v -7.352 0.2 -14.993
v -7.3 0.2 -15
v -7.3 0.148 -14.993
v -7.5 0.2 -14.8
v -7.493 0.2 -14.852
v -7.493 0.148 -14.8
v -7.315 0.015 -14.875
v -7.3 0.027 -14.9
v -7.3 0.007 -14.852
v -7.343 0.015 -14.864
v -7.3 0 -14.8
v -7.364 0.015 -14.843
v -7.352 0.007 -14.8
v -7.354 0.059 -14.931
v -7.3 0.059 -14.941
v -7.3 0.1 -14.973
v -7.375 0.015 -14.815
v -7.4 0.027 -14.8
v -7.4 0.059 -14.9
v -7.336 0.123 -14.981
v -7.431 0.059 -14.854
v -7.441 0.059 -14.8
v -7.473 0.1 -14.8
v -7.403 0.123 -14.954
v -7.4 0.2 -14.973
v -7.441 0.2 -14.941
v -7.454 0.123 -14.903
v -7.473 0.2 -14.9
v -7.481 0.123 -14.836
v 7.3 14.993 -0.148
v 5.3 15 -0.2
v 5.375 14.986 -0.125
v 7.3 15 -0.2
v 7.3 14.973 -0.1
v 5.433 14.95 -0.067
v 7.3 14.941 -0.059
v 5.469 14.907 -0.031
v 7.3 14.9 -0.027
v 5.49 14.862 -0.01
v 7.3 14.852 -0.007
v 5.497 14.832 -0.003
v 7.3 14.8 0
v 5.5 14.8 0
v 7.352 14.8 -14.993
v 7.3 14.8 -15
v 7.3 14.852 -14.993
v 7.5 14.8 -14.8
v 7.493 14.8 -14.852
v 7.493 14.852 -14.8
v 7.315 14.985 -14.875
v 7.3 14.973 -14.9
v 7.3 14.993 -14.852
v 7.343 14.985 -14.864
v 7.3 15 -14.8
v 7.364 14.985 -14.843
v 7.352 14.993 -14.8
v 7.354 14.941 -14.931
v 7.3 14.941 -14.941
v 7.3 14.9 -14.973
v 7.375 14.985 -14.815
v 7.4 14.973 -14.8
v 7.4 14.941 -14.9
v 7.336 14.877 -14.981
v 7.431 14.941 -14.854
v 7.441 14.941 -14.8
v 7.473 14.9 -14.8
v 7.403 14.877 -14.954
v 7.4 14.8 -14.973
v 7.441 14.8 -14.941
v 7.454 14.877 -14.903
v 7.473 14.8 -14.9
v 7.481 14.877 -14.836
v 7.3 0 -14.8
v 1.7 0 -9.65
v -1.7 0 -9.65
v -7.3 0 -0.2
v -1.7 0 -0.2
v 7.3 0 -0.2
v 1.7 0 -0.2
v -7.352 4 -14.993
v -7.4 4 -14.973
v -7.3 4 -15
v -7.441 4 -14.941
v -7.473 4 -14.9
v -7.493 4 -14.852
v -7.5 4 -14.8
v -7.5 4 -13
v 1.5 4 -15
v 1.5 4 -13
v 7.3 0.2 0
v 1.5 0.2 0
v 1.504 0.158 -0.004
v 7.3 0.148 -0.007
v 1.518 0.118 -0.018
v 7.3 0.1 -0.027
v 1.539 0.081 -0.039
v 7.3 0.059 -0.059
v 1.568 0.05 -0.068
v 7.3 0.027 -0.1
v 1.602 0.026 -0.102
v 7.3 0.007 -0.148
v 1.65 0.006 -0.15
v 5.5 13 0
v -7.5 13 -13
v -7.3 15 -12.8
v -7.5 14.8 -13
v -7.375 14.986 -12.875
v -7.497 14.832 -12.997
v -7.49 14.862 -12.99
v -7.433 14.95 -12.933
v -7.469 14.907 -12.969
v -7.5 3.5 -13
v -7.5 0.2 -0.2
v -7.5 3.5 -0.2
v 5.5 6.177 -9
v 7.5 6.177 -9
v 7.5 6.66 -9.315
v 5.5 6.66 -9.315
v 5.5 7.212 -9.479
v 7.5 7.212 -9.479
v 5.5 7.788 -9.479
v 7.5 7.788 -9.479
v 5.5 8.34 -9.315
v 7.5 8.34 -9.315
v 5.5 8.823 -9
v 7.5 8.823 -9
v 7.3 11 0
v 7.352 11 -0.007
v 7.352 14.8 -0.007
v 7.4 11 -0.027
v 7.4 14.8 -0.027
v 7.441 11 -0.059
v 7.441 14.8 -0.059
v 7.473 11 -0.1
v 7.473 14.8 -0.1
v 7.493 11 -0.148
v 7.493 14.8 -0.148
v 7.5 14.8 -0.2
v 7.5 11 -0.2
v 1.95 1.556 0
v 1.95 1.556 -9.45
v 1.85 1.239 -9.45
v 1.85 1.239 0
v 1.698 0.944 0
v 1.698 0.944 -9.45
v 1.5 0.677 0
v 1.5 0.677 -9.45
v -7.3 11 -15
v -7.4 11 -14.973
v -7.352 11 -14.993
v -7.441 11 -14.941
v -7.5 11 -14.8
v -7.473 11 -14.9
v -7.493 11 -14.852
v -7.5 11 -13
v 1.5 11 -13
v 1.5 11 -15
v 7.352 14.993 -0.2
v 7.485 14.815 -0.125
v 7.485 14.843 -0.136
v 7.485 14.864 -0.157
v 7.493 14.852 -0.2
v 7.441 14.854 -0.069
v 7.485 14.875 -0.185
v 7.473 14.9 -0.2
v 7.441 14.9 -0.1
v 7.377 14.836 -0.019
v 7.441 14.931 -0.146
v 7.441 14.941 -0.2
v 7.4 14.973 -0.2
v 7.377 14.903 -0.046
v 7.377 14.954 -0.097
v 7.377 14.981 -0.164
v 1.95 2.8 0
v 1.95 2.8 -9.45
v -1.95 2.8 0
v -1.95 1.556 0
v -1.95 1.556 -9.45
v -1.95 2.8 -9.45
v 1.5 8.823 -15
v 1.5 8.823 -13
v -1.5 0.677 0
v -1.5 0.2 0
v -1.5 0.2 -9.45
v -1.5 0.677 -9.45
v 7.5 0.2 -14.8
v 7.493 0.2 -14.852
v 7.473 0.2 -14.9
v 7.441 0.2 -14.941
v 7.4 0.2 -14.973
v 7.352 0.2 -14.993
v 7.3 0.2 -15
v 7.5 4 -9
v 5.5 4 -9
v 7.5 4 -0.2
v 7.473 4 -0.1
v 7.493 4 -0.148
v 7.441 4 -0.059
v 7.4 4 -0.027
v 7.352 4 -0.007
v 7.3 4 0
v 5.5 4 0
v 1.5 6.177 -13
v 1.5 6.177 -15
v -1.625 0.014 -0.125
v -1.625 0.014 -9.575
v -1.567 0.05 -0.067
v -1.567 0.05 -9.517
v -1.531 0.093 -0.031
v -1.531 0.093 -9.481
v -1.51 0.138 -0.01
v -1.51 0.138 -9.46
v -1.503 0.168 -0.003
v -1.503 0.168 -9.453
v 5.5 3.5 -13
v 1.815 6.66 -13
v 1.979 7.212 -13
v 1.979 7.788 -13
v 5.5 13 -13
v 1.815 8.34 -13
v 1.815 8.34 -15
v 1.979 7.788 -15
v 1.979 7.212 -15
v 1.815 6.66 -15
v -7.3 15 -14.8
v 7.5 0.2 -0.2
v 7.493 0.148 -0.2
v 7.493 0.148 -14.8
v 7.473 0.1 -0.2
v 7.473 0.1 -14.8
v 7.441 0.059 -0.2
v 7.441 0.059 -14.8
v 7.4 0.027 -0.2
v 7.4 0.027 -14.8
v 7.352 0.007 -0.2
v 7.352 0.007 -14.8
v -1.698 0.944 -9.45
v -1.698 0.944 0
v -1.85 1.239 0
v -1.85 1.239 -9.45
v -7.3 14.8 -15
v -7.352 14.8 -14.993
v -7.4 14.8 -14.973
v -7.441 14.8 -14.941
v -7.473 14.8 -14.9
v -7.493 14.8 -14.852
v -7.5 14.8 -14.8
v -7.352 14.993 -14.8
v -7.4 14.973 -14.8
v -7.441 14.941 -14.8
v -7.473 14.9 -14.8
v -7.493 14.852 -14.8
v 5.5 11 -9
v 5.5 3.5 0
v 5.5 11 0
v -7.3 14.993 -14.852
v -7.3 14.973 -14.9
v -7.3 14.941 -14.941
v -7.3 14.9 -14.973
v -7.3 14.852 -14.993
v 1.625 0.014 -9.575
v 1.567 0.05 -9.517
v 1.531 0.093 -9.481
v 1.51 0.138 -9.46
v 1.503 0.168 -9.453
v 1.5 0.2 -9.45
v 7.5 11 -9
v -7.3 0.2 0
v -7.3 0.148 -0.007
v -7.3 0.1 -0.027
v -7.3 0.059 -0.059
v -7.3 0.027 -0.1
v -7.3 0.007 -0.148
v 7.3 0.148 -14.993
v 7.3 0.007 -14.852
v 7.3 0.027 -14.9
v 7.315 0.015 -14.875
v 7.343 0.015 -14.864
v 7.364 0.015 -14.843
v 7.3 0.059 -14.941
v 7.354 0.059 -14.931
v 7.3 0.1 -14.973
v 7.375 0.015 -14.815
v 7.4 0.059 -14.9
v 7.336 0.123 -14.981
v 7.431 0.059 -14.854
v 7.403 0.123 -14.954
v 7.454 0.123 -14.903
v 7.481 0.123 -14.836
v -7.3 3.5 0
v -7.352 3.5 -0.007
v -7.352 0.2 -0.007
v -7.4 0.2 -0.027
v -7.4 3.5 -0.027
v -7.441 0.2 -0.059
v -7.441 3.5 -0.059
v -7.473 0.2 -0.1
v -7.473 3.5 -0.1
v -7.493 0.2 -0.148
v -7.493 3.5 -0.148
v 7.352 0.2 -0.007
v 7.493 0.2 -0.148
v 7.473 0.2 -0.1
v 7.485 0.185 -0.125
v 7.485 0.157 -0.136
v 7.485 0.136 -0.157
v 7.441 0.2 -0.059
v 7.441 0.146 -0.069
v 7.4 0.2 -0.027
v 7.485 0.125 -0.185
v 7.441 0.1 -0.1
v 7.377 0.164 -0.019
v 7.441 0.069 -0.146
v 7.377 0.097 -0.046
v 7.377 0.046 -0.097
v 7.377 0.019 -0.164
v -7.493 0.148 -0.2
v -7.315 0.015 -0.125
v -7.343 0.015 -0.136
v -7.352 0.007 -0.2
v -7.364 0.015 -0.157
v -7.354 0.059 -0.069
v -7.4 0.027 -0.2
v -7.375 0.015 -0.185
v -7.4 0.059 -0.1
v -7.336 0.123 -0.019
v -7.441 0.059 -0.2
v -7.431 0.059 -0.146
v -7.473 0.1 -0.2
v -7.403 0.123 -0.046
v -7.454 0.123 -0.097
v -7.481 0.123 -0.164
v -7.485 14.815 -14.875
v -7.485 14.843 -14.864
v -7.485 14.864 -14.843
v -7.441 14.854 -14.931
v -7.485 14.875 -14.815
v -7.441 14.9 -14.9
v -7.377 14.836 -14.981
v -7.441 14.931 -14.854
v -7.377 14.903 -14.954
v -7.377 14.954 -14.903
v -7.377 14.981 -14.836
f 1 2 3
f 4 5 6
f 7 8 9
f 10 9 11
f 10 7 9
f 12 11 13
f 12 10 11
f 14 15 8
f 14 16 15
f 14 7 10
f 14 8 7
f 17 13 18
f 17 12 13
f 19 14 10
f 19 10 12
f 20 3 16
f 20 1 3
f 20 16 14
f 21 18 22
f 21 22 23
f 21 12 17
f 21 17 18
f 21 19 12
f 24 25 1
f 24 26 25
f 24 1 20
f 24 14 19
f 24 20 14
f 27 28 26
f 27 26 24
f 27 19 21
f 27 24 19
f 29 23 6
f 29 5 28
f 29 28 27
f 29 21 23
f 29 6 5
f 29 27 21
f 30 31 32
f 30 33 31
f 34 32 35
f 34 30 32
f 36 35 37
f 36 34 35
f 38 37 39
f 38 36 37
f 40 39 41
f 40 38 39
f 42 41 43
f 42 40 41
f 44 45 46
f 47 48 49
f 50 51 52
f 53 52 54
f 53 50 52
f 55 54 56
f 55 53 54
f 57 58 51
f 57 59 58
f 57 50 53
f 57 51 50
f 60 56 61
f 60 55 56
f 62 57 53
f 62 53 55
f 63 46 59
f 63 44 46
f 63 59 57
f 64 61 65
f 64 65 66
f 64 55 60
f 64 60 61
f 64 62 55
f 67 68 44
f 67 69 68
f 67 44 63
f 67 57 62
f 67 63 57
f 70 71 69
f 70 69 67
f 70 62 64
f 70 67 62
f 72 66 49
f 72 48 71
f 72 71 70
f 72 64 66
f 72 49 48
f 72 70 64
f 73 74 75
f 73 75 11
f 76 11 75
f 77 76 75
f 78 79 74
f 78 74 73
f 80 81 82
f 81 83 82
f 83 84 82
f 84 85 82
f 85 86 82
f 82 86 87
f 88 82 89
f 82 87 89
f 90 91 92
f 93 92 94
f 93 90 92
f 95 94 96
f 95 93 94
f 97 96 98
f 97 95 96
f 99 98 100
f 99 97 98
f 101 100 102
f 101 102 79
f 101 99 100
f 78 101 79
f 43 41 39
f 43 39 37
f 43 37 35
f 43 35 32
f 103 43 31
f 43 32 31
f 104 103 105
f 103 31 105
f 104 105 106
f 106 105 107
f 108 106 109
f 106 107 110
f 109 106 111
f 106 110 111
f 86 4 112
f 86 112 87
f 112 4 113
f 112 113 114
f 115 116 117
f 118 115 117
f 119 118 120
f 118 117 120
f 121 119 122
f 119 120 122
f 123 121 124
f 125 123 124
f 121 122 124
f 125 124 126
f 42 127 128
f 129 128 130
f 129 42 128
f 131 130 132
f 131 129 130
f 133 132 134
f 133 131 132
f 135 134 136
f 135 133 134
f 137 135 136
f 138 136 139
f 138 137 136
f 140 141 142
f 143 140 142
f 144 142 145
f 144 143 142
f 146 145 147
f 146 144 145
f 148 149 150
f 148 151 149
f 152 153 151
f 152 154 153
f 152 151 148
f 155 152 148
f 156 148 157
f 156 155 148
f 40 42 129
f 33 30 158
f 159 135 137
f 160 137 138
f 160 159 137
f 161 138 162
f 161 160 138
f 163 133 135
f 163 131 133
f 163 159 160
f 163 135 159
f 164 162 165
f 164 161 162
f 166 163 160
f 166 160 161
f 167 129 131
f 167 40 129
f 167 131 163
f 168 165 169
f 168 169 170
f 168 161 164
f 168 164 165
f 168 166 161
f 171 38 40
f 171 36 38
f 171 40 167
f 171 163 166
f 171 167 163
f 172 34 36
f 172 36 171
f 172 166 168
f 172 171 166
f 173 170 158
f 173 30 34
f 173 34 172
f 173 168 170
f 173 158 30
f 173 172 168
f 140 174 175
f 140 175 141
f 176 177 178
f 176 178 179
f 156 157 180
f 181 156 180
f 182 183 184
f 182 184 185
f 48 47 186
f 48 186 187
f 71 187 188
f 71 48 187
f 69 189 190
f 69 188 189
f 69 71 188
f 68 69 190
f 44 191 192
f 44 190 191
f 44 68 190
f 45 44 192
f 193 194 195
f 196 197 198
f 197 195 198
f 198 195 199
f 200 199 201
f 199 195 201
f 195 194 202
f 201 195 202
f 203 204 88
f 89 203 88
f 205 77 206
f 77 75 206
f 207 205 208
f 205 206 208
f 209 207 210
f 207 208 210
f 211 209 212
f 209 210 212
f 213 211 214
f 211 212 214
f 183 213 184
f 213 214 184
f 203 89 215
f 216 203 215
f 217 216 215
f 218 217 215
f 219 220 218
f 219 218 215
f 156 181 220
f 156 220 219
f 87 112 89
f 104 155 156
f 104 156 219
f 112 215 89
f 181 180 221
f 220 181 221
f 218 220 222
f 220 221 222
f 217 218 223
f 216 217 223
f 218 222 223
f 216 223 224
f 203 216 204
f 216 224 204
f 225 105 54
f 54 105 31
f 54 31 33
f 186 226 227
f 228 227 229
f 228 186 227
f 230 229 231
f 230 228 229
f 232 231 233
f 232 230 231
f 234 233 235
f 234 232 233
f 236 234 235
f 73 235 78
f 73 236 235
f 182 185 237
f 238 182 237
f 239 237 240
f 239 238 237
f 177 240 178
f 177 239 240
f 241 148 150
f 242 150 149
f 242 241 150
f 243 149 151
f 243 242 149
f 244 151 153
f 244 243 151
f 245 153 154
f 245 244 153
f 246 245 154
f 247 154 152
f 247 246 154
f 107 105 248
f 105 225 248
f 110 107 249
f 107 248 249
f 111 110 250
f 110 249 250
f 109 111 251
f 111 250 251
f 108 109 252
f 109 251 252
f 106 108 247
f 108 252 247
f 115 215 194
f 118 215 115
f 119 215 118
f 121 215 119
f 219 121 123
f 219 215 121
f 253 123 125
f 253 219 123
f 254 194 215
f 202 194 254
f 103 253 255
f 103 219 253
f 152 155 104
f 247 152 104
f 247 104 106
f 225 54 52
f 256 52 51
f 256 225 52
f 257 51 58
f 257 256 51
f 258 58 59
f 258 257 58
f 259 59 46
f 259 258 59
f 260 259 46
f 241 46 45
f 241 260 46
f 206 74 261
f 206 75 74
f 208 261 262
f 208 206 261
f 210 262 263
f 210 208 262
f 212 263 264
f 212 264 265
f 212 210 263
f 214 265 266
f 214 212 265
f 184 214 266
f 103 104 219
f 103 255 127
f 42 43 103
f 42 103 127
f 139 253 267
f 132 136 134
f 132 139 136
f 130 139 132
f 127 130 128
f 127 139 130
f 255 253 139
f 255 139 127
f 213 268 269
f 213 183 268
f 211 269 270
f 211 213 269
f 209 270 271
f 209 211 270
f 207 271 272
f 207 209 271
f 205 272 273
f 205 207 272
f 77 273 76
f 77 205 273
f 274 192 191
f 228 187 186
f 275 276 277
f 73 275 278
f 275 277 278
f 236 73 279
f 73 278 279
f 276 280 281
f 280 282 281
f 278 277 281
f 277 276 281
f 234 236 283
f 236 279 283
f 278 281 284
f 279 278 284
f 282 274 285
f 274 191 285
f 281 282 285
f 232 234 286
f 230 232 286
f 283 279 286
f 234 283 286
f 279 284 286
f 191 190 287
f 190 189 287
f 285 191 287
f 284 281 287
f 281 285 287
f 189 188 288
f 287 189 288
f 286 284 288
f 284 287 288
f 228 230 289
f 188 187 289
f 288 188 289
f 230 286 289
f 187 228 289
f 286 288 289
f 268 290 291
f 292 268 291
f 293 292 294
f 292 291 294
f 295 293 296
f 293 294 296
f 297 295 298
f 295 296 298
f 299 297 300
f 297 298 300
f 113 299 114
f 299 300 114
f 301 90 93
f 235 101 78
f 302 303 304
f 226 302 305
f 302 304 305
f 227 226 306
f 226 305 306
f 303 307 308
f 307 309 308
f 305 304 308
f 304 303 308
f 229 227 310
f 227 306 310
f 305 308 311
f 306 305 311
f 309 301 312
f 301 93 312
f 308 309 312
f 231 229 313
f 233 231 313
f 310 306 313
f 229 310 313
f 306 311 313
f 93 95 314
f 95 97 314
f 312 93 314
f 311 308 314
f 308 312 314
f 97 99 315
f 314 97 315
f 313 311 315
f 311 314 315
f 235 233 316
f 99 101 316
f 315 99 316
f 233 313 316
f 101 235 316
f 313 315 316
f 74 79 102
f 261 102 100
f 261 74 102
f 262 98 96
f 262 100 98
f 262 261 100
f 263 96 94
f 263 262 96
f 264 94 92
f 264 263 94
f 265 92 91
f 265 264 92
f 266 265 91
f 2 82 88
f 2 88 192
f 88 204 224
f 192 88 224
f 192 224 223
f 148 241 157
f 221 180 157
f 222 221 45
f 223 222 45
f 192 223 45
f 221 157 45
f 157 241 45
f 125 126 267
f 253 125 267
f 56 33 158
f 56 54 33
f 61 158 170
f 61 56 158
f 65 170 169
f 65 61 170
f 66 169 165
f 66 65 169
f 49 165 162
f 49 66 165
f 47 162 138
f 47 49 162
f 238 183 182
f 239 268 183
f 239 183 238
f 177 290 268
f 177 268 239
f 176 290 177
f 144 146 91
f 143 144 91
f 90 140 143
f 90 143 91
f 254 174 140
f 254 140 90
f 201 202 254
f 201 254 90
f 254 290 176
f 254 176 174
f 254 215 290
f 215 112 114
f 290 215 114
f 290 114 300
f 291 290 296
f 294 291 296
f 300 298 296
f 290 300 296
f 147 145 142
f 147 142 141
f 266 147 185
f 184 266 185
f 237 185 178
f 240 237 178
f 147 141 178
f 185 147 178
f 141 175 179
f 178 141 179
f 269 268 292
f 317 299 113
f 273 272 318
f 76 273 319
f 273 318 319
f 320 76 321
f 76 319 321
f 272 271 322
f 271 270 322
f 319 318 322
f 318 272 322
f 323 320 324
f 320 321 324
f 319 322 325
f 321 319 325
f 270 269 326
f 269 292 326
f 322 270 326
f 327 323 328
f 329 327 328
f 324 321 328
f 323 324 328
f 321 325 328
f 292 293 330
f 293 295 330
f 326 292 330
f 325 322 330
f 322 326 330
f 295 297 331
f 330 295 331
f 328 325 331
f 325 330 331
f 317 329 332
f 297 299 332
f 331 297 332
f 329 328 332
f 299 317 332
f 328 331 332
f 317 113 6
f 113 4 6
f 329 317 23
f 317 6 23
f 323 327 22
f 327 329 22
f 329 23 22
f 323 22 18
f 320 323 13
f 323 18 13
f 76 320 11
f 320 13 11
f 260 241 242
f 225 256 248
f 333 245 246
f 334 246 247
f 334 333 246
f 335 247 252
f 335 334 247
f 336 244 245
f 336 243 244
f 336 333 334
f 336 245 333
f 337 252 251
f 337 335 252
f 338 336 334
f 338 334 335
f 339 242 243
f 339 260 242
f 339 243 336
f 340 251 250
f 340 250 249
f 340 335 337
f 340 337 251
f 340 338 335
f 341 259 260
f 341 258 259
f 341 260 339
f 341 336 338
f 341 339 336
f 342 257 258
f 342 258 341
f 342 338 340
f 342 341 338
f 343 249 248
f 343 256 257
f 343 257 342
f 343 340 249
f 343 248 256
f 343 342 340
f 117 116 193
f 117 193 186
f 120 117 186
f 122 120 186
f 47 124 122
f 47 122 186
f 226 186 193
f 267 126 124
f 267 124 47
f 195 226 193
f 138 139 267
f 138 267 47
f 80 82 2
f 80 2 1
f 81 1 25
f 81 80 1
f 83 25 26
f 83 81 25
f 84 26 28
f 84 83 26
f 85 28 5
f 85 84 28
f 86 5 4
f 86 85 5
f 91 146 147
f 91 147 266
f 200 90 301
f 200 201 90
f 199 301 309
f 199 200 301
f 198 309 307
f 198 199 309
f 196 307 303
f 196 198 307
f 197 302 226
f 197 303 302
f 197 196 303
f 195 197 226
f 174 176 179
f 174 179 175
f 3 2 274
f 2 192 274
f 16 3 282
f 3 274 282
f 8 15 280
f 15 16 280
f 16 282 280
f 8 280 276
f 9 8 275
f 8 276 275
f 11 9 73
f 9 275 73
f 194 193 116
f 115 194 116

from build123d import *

# Parameters (mm, degrees)
SKETCH_1_W                      = 15
SKETCH_1_H                      = 15
EXTRUDE_1_DEPTH                 = 15
SKETCH_2_W                      = 13
SKETCH_2_H                      = 9.5
CUT_EXTRUDE_1_DEPTH             = 13
CUT_EXTRUDE_2_DEPTH             = 9.45
EXTRUDE_START                   = -4.5
EXTRUDE_2_DEPTH                 = 6
SKETCH_5_W                      = 3
SKETCH_5_H                      = 3
EXTRUDE_3_DEPTH                 = 1
CUT_EXTRUDE_3_REACH             = 26.238
CUT_EXTRUDE_4_REACH             = 29.5
CUT_EXTRUDE_5_REACH             = 26.238
CUT_EXTRUDE_5_DIRECTION_2_REACH = 26.238
SKETCH_10_W                     = 5.767295788
SKETCH_10_H                     = 2.858107371
CUT_EXTRUDE_7_DEPTH             = 25.238399287
CUT_EXTRUDE_8_DEPTH             = 2
FILLET_2_R                      = 0.2
CUT_EXTRUDE_9_REACH             = 26.88
SKETCH_12_W                     = 9
SKETCH_12_H                     = 7
CUT_EXTRUDE_10_REACH            = 23.219
SKETCH_13_W                     = 9
SKETCH_13_H                     = 7


with BuildPart() as part:
    # 草图1 → 凸台-拉伸1 (new body)
    with BuildSketch(Plane.XY):
        with Locations((0, 7.5)):
            Rectangle(SKETCH_1_W, SKETCH_1_H)
    extrude(amount=-EXTRUDE_1_DEPTH)

    # 草图2 → 切除-拉伸1 (cut)
    with BuildSketch(Plane.ZY.offset(7.5)):
        with Locations((-6.5, 8.25)):
            Rectangle(SKETCH_2_W, SKETCH_2_H)
    extrude(amount=-CUT_EXTRUDE_1_DEPTH, mode=Mode.SUBTRACT)

    # 草图3 → 切除-拉伸2 (cut)
    with BuildSketch(Plane.XY):
        with BuildLine():
            Line((-1.5, 0), (-1.5, 0.677124344))
            ThreePointArc((-1.5, 0.677124344), (-1.780042303, 1.088161527), (-1.95, 1.555590279))
            Line((-1.95, 1.555590279), (-1.95, 2.8))
            Line((-1.95, 2.8), (1.95, 2.8))
            Line((1.95, 2.8), (1.95, 1.555590279))
            ThreePointArc((1.95, 1.555590279), (1.780042303, 1.088161527), (1.5, 0.677124344))
            Line((1.5, 0.677124344), (1.5, 0))
            Line((1.5, 0), (-1.5, 0))
        make_face()
    extrude(amount=-CUT_EXTRUDE_2_DEPTH, mode=Mode.SUBTRACT)



with BuildPart() as body_2:
    # 草图4 → 凸台-拉伸2 (new body)
    with BuildSketch(Plane.XY.offset(EXTRUDE_START)):
        with BuildLine():
            Line((-1.5, 15.677124344), (1.5, 15.677124344))
            ThreePointArc((1.5, 15.677124344), (1.780042303, 16.088161527), (1.95, 16.555590279))
            Line((1.95, 16.555590279), (1.95, 17.5))
            Line((1.95, 17.5), (-1.95, 17.5))
            Line((-1.95, 17.5), (-1.95, 16.555590279))
            ThreePointArc((-1.95, 16.555590279), (-1.780042303, 16.088161527), (-1.5, 15.677124344))
        make_face()
    extrude(amount=-EXTRUDE_2_DEPTH)


with BuildPart() as part_1:
    add(part.part)

    add(body_2.part)  # 凸台-拉伸3 merges body 2
    # 草图5 → 凸台-拉伸3 (add)
    with BuildSketch(Plane(origin=(0, 15, 0), x_dir=(-1, 0, 0), z_dir=(0, 1, 0))):
        with Locations((0, -7.5)):
            Rectangle(SKETCH_5_W, SKETCH_5_H)
    extrude(amount=EXTRUDE_3_DEPTH)

    # 草图6 → 切除-拉伸3 (cut, up to next)
    with BuildSketch(Plane(origin=(0, 0, -15), x_dir=(-1, 0, 0), z_dir=(0, 0, -1)), mode=Mode.PRIVATE) as cut_extrude_3_sk1:
        with BuildLine():
            Line((-1.5, 6.177124344), (-1.5, 4))
            Line((-1.5, 4), (1.5, 4))
            Line((1.5, 4), (1.5, 6.177124344))
            ThreePointArc((1.5, 6.177124344), (2, 7.5), (1.5, 8.822875656))
            Line((1.5, 8.822875656), (1.5, 11))
            Line((1.5, 11), (-1.5, 11))
            Line((-1.5, 11), (-1.5, 8.822875656))
            ThreePointArc((-1.5, 8.822875656), (-2, 7.5), (-1.5, 6.177124344))
        make_face()
    cut_extrude_3_tool1 = extrude(cut_extrude_3_sk1.sketch, amount=-CUT_EXTRUDE_3_REACH, mode=Mode.PRIVATE) & part_1.part
    add(cut_extrude_3_tool1.solids().sort_by_distance((0, 7.5, -15))[0], mode=Mode.SUBTRACT)

    # 草图7 → 切除-拉伸4 (cut, up to next)
    with BuildSketch(Plane(origin=(7.5, 0, 0), x_dir=(0, 0, -1), z_dir=(1, 0, 0)), mode=Mode.PRIVATE) as cut_extrude_4_sk1:
        with BuildLine():
            Line((6, 6.177124344), (6, 4))
            Line((6, 4), (9, 4))
            Line((9, 4), (9, 6.177124344))
            ThreePointArc((9, 6.177124344), (9.5, 7.5), (9, 8.822875656))
            Line((9, 8.822875656), (9, 11))
            Line((9, 11), (6, 11))
            Line((6, 11), (6, 8.822875656))
            ThreePointArc((6, 8.822875656), (5.5, 7.5), (6, 6.177124344))
        make_face()
    cut_extrude_4_tool1 = extrude(cut_extrude_4_sk1.sketch, amount=-CUT_EXTRUDE_4_REACH, mode=Mode.PRIVATE) & part_1.part
    add(cut_extrude_4_tool1.solids().sort_by_distance((7.5, 7.5, -7.5))[0], mode=Mode.SUBTRACT)

    # 草图8 → 切除-拉伸5 (cut, up to next)
    with BuildSketch(Plane(origin=(0, 0, 0), x_dir=(0, 0, -1), z_dir=(1, 0, 0)), mode=Mode.PRIVATE) as cut_extrude_5_sk1:
        with BuildLine():
            Line((5.55, 17.5), (5.55, 16.555590279))
            ThreePointArc((5.55, 16.555590279), (5.719957697, 16.088161527), (6, 15.677124344))
            Line((6, 15.677124344), (4.5, 15.677124344))
            Line((4.5, 15.677124344), (4.5, 17.5))
            Line((4.5, 17.5), (5.55, 17.5))
        make_face()
    cut_extrude_5_tool1 = extrude(cut_extrude_5_sk1.sketch, amount=-CUT_EXTRUDE_5_REACH, mode=Mode.PRIVATE) & part_1.part
    # 草图8 → 切除-拉伸5 (cut, up to next)
    with BuildSketch(Plane(origin=(0, 0, 0), x_dir=(0, 0, -1), z_dir=(1, 0, 0)), mode=Mode.PRIVATE) as cut_extrude_5_sk2:
        with BuildLine():
            Line((10.5, 17.5), (9.45, 17.5))
            Line((9.45, 17.5), (9.45, 16.555590279))
            ThreePointArc((9.45, 16.555590279), (9.280042303, 16.088161527), (9, 15.677124344))
            Line((9, 15.677124344), (10.5, 15.677124344))
            Line((10.5, 15.677124344), (10.5, 17.5))
        make_face()
    cut_extrude_5_tool2 = extrude(cut_extrude_5_sk2.sketch, amount=-CUT_EXTRUDE_5_REACH, mode=Mode.PRIVATE) & part_1.part
    add(cut_extrude_5_tool1.solids().sort_by_distance((0, 16.539049, -5.075076))[0], mode=Mode.SUBTRACT)
    add(cut_extrude_5_tool2.solids().sort_by_distance((0, 16.539049, -9.924924))[0], mode=Mode.SUBTRACT)

    # 草图8 → 切除-拉伸5 direction 2 (cut, up to next)
    with BuildSketch(Plane(origin=(0, 0, 0), x_dir=(0, 0, -1), z_dir=(1, 0, 0)), mode=Mode.PRIVATE) as cut_extrude_5_direction_2_sk1:
        with BuildLine():
            Line((5.55, 17.5), (5.55, 16.555590279))
            ThreePointArc((5.55, 16.555590279), (5.719957697, 16.088161527), (6, 15.677124344))
            Line((6, 15.677124344), (4.5, 15.677124344))
            Line((4.5, 15.677124344), (4.5, 17.5))
            Line((4.5, 17.5), (5.55, 17.5))
        make_face()
    cut_extrude_5_direction_2_tool1 = extrude(cut_extrude_5_direction_2_sk1.sketch, amount=CUT_EXTRUDE_5_DIRECTION_2_REACH, mode=Mode.PRIVATE) & part_1.part
    # 草图8 → 切除-拉伸5 direction 2 (cut, up to next)
    with BuildSketch(Plane(origin=(0, 0, 0), x_dir=(0, 0, -1), z_dir=(1, 0, 0)), mode=Mode.PRIVATE) as cut_extrude_5_direction_2_sk2:
        with BuildLine():
            Line((10.5, 17.5), (9.45, 17.5))
            Line((9.45, 17.5), (9.45, 16.555590279))
            ThreePointArc((9.45, 16.555590279), (9.280042303, 16.088161527), (9, 15.677124344))
            Line((9, 15.677124344), (10.5, 15.677124344))
            Line((10.5, 15.677124344), (10.5, 17.5))
        make_face()
    cut_extrude_5_direction_2_tool2 = extrude(cut_extrude_5_direction_2_sk2.sketch, amount=CUT_EXTRUDE_5_DIRECTION_2_REACH, mode=Mode.PRIVATE) & part_1.part
    add(cut_extrude_5_direction_2_tool1.solids().sort_by_distance((0, 16.539049, -5.075076))[0], mode=Mode.SUBTRACT)
    add(cut_extrude_5_direction_2_tool2.solids().sort_by_distance((0, 16.539049, -9.924924))[0], mode=Mode.SUBTRACT)

    # 草图10 → 切除-拉伸7 (cut, through all)
    with BuildSketch(Plane.XY):
        with Locations((0, 16.429053686)):
            Rectangle(SKETCH_10_W, SKETCH_10_H)
    extrude(amount=-CUT_EXTRUDE_7_DEPTH, mode=Mode.SUBTRACT)

    # 草图11 → 切除-拉伸8 (cut)
    with BuildSketch(Plane(origin=(0, 15, 0), x_dir=(-1, 0, 0), z_dir=(0, 1, 0))):
        Polygon((7.5, -13), (7.5, 0), (-5.5, 0), align=None)
    extrude(amount=-CUT_EXTRUDE_8_DEPTH, mode=Mode.SUBTRACT)

    # 圆角2
    fillet_2_edges = [part_1.edges().sort_by_distance(p)[0] for p in [
        (7.5, 7.5, -15),
        (0, 15, -15),
        (-7.5, 1.75, 0),
        (4.5, 0, 0),
        (0, 0, -9.45),
        (1.5, 0, -4.725),
        (-1.5, 0, -4.725),
        (-7.5, 7.5, -15),
        (6.5, 15, 0),
        (7.5, 7.5, 0),
        (-4.5, 0, 0),
        (0, 0, -15),
        (-7.5, 15, -14),
        (7.5, 15, -7.5),
        (7.5, 0, -7.5),
        (-7.5, 0, -7.5),
    ]]
    fillet(fillet_2_edges, radius=FILLET_2_R)

    # 草图12 → 切除-拉伸9 (cut, up to next)
    with BuildSketch(Plane.ZY.offset(-5.5), mode=Mode.PRIVATE) as cut_extrude_9_sk1:
        with Locations((-4.5, 7.5)):
            Rectangle(SKETCH_12_W, SKETCH_12_H)
    cut_extrude_9_tool1 = extrude(cut_extrude_9_sk1.sketch, amount=-CUT_EXTRUDE_9_REACH, mode=Mode.PRIVATE) & part_1.part
    add(cut_extrude_9_tool1.solids().sort_by_distance((5.5, 7.5, -4.5))[0], mode=Mode.SUBTRACT)

    # 草图13 → 切除-拉伸10 (cut, up to next)
    with BuildSketch(Plane.XY.offset(-13), mode=Mode.PRIVATE) as cut_extrude_10_sk1:
        with Locations((-3, 7.5)):
            Rectangle(SKETCH_13_W, SKETCH_13_H)
    cut_extrude_10_tool1 = extrude(cut_extrude_10_sk1.sketch, amount=-CUT_EXTRUDE_10_REACH, mode=Mode.PRIVATE) & part_1.part
    add(cut_extrude_10_tool1.solids().sort_by_distance((-3, 7.5, -13))[0], mode=Mode.SUBTRACT)


solid = part_1.part
